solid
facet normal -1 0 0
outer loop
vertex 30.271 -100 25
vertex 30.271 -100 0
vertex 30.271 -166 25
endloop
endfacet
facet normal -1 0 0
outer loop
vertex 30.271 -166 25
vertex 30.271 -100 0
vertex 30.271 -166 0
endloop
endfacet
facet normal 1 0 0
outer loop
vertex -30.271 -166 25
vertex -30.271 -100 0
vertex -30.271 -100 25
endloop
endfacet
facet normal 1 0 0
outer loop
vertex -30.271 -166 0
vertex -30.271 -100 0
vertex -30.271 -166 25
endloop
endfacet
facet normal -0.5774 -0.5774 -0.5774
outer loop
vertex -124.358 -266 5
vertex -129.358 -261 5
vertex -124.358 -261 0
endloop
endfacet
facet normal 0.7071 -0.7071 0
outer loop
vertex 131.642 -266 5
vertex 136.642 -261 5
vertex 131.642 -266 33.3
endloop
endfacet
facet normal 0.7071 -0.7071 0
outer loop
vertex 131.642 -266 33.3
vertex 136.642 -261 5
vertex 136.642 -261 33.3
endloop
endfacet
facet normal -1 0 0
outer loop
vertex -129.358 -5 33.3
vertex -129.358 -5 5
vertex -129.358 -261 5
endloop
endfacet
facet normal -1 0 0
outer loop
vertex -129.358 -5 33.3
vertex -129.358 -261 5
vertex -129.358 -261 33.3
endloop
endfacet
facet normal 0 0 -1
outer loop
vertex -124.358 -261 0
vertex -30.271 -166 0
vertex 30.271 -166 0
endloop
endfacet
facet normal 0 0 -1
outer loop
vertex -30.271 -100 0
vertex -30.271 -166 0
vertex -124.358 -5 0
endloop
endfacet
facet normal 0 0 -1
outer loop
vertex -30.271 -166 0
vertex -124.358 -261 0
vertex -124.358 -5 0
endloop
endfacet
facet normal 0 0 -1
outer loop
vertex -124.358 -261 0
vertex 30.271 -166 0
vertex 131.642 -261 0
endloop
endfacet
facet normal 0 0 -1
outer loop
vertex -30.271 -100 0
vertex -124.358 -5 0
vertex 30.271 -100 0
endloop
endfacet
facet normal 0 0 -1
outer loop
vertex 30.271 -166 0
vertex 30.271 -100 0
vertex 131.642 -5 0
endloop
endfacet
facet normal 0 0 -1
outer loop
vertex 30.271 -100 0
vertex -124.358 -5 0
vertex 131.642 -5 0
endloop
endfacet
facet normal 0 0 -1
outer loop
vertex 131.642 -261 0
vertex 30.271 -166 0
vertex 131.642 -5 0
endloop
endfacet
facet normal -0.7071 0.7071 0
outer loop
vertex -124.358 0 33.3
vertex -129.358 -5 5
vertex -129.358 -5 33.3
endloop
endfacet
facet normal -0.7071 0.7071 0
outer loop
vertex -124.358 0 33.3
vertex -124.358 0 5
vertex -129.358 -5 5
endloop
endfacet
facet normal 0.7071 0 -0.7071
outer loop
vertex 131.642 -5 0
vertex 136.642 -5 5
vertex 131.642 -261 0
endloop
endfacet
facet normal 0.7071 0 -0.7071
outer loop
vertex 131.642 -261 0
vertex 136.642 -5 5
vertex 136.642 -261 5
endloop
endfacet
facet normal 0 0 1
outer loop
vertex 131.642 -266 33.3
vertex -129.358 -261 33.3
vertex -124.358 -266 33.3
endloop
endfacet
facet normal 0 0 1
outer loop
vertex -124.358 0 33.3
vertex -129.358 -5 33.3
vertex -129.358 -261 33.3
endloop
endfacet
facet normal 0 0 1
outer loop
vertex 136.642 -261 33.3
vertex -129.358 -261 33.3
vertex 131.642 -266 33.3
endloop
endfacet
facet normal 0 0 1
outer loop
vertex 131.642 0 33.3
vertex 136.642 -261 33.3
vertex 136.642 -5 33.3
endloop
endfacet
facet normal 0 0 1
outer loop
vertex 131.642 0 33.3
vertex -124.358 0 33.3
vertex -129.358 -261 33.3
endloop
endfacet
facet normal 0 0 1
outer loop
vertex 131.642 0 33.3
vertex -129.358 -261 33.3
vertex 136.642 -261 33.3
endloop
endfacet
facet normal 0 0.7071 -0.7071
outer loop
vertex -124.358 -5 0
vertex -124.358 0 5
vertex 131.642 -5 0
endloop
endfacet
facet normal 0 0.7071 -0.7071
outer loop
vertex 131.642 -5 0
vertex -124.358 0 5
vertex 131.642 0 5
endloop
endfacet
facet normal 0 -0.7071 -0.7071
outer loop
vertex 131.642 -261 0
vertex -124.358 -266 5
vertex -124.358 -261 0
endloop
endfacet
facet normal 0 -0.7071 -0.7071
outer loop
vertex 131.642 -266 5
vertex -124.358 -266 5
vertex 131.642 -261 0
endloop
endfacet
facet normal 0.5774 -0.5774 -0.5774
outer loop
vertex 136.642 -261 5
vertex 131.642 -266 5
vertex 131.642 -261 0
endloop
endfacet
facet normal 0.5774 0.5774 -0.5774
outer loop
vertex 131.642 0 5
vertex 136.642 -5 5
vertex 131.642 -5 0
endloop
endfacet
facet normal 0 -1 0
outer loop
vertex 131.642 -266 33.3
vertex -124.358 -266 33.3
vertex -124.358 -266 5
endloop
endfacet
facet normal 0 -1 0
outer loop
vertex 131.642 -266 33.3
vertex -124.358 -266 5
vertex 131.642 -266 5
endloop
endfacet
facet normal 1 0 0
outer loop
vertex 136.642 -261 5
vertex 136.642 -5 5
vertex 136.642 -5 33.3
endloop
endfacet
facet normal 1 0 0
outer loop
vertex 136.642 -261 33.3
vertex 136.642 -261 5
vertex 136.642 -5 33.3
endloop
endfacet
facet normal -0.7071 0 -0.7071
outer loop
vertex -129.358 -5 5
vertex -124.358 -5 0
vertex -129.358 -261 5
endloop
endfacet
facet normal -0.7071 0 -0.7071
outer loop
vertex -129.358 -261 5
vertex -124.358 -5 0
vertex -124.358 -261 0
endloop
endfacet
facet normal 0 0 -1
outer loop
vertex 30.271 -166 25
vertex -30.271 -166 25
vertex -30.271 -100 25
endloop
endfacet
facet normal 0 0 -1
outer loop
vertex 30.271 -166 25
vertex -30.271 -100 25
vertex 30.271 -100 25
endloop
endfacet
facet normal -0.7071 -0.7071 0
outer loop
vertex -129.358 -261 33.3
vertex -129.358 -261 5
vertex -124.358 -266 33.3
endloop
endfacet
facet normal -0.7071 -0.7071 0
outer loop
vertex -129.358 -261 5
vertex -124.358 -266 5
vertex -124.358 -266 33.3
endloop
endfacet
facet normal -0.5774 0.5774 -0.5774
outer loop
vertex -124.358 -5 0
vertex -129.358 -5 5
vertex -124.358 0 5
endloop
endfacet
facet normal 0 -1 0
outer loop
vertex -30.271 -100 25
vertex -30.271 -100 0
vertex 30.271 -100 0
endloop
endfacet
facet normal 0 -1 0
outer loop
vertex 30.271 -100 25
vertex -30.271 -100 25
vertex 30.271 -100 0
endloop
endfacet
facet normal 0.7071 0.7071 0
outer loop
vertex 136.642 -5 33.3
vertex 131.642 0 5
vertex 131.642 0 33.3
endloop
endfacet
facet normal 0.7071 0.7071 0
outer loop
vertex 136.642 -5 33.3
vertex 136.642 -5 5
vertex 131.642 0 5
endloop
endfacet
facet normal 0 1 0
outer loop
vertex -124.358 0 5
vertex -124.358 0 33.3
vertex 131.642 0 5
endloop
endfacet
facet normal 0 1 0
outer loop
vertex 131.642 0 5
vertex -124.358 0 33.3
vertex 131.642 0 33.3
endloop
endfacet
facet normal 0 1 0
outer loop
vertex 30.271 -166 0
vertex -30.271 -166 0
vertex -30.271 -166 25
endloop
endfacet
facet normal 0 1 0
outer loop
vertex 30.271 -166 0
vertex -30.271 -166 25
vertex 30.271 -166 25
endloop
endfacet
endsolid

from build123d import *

# Parameters (mm, degrees)
F0_W     = 266
F0_H     = 33.3
F1_DEPTH = 266
F2_W     = 60.54271
F2_H     = 66
F3_DEPTH = 25
F4_SIZE  = 5


with BuildPart() as f1:
    # F0 (on Front) → F1 (new body)
    with BuildSketch(Plane.XZ):
        with Locations((3.64231, 16.65)):
            Rectangle(F0_W, F0_H)
    extrude(amount=F1_DEPTH)

    # F2 (on face) → F3 (cut)
    with BuildSketch(Plane(origin=(0, 0, 0), x_dir=(1, 0, 0), z_dir=(0, 0, -1))):
        with Locations((0, 133)):
            Rectangle(F2_W, F2_H)
    extrude(amount=-F3_DEPTH, mode=Mode.SUBTRACT)

    # F4
    f4_edges = [f1.edges().sort_by_distance(p)[0] for p in [
        (136.64231, -266, 16.65),
        (136.64231, 0, 16.65),
        (-129.35769, 0, 16.65),
        (-129.35769, -266, 16.65),
        (-129.35769, -133, 0),
        (3.64231, -266, 0),
        (136.64231, -133, 0),
        (3.64231, 0, 0),
    ]]
    chamfer(f4_edges, length=F4_SIZE)


solid = f1.part
